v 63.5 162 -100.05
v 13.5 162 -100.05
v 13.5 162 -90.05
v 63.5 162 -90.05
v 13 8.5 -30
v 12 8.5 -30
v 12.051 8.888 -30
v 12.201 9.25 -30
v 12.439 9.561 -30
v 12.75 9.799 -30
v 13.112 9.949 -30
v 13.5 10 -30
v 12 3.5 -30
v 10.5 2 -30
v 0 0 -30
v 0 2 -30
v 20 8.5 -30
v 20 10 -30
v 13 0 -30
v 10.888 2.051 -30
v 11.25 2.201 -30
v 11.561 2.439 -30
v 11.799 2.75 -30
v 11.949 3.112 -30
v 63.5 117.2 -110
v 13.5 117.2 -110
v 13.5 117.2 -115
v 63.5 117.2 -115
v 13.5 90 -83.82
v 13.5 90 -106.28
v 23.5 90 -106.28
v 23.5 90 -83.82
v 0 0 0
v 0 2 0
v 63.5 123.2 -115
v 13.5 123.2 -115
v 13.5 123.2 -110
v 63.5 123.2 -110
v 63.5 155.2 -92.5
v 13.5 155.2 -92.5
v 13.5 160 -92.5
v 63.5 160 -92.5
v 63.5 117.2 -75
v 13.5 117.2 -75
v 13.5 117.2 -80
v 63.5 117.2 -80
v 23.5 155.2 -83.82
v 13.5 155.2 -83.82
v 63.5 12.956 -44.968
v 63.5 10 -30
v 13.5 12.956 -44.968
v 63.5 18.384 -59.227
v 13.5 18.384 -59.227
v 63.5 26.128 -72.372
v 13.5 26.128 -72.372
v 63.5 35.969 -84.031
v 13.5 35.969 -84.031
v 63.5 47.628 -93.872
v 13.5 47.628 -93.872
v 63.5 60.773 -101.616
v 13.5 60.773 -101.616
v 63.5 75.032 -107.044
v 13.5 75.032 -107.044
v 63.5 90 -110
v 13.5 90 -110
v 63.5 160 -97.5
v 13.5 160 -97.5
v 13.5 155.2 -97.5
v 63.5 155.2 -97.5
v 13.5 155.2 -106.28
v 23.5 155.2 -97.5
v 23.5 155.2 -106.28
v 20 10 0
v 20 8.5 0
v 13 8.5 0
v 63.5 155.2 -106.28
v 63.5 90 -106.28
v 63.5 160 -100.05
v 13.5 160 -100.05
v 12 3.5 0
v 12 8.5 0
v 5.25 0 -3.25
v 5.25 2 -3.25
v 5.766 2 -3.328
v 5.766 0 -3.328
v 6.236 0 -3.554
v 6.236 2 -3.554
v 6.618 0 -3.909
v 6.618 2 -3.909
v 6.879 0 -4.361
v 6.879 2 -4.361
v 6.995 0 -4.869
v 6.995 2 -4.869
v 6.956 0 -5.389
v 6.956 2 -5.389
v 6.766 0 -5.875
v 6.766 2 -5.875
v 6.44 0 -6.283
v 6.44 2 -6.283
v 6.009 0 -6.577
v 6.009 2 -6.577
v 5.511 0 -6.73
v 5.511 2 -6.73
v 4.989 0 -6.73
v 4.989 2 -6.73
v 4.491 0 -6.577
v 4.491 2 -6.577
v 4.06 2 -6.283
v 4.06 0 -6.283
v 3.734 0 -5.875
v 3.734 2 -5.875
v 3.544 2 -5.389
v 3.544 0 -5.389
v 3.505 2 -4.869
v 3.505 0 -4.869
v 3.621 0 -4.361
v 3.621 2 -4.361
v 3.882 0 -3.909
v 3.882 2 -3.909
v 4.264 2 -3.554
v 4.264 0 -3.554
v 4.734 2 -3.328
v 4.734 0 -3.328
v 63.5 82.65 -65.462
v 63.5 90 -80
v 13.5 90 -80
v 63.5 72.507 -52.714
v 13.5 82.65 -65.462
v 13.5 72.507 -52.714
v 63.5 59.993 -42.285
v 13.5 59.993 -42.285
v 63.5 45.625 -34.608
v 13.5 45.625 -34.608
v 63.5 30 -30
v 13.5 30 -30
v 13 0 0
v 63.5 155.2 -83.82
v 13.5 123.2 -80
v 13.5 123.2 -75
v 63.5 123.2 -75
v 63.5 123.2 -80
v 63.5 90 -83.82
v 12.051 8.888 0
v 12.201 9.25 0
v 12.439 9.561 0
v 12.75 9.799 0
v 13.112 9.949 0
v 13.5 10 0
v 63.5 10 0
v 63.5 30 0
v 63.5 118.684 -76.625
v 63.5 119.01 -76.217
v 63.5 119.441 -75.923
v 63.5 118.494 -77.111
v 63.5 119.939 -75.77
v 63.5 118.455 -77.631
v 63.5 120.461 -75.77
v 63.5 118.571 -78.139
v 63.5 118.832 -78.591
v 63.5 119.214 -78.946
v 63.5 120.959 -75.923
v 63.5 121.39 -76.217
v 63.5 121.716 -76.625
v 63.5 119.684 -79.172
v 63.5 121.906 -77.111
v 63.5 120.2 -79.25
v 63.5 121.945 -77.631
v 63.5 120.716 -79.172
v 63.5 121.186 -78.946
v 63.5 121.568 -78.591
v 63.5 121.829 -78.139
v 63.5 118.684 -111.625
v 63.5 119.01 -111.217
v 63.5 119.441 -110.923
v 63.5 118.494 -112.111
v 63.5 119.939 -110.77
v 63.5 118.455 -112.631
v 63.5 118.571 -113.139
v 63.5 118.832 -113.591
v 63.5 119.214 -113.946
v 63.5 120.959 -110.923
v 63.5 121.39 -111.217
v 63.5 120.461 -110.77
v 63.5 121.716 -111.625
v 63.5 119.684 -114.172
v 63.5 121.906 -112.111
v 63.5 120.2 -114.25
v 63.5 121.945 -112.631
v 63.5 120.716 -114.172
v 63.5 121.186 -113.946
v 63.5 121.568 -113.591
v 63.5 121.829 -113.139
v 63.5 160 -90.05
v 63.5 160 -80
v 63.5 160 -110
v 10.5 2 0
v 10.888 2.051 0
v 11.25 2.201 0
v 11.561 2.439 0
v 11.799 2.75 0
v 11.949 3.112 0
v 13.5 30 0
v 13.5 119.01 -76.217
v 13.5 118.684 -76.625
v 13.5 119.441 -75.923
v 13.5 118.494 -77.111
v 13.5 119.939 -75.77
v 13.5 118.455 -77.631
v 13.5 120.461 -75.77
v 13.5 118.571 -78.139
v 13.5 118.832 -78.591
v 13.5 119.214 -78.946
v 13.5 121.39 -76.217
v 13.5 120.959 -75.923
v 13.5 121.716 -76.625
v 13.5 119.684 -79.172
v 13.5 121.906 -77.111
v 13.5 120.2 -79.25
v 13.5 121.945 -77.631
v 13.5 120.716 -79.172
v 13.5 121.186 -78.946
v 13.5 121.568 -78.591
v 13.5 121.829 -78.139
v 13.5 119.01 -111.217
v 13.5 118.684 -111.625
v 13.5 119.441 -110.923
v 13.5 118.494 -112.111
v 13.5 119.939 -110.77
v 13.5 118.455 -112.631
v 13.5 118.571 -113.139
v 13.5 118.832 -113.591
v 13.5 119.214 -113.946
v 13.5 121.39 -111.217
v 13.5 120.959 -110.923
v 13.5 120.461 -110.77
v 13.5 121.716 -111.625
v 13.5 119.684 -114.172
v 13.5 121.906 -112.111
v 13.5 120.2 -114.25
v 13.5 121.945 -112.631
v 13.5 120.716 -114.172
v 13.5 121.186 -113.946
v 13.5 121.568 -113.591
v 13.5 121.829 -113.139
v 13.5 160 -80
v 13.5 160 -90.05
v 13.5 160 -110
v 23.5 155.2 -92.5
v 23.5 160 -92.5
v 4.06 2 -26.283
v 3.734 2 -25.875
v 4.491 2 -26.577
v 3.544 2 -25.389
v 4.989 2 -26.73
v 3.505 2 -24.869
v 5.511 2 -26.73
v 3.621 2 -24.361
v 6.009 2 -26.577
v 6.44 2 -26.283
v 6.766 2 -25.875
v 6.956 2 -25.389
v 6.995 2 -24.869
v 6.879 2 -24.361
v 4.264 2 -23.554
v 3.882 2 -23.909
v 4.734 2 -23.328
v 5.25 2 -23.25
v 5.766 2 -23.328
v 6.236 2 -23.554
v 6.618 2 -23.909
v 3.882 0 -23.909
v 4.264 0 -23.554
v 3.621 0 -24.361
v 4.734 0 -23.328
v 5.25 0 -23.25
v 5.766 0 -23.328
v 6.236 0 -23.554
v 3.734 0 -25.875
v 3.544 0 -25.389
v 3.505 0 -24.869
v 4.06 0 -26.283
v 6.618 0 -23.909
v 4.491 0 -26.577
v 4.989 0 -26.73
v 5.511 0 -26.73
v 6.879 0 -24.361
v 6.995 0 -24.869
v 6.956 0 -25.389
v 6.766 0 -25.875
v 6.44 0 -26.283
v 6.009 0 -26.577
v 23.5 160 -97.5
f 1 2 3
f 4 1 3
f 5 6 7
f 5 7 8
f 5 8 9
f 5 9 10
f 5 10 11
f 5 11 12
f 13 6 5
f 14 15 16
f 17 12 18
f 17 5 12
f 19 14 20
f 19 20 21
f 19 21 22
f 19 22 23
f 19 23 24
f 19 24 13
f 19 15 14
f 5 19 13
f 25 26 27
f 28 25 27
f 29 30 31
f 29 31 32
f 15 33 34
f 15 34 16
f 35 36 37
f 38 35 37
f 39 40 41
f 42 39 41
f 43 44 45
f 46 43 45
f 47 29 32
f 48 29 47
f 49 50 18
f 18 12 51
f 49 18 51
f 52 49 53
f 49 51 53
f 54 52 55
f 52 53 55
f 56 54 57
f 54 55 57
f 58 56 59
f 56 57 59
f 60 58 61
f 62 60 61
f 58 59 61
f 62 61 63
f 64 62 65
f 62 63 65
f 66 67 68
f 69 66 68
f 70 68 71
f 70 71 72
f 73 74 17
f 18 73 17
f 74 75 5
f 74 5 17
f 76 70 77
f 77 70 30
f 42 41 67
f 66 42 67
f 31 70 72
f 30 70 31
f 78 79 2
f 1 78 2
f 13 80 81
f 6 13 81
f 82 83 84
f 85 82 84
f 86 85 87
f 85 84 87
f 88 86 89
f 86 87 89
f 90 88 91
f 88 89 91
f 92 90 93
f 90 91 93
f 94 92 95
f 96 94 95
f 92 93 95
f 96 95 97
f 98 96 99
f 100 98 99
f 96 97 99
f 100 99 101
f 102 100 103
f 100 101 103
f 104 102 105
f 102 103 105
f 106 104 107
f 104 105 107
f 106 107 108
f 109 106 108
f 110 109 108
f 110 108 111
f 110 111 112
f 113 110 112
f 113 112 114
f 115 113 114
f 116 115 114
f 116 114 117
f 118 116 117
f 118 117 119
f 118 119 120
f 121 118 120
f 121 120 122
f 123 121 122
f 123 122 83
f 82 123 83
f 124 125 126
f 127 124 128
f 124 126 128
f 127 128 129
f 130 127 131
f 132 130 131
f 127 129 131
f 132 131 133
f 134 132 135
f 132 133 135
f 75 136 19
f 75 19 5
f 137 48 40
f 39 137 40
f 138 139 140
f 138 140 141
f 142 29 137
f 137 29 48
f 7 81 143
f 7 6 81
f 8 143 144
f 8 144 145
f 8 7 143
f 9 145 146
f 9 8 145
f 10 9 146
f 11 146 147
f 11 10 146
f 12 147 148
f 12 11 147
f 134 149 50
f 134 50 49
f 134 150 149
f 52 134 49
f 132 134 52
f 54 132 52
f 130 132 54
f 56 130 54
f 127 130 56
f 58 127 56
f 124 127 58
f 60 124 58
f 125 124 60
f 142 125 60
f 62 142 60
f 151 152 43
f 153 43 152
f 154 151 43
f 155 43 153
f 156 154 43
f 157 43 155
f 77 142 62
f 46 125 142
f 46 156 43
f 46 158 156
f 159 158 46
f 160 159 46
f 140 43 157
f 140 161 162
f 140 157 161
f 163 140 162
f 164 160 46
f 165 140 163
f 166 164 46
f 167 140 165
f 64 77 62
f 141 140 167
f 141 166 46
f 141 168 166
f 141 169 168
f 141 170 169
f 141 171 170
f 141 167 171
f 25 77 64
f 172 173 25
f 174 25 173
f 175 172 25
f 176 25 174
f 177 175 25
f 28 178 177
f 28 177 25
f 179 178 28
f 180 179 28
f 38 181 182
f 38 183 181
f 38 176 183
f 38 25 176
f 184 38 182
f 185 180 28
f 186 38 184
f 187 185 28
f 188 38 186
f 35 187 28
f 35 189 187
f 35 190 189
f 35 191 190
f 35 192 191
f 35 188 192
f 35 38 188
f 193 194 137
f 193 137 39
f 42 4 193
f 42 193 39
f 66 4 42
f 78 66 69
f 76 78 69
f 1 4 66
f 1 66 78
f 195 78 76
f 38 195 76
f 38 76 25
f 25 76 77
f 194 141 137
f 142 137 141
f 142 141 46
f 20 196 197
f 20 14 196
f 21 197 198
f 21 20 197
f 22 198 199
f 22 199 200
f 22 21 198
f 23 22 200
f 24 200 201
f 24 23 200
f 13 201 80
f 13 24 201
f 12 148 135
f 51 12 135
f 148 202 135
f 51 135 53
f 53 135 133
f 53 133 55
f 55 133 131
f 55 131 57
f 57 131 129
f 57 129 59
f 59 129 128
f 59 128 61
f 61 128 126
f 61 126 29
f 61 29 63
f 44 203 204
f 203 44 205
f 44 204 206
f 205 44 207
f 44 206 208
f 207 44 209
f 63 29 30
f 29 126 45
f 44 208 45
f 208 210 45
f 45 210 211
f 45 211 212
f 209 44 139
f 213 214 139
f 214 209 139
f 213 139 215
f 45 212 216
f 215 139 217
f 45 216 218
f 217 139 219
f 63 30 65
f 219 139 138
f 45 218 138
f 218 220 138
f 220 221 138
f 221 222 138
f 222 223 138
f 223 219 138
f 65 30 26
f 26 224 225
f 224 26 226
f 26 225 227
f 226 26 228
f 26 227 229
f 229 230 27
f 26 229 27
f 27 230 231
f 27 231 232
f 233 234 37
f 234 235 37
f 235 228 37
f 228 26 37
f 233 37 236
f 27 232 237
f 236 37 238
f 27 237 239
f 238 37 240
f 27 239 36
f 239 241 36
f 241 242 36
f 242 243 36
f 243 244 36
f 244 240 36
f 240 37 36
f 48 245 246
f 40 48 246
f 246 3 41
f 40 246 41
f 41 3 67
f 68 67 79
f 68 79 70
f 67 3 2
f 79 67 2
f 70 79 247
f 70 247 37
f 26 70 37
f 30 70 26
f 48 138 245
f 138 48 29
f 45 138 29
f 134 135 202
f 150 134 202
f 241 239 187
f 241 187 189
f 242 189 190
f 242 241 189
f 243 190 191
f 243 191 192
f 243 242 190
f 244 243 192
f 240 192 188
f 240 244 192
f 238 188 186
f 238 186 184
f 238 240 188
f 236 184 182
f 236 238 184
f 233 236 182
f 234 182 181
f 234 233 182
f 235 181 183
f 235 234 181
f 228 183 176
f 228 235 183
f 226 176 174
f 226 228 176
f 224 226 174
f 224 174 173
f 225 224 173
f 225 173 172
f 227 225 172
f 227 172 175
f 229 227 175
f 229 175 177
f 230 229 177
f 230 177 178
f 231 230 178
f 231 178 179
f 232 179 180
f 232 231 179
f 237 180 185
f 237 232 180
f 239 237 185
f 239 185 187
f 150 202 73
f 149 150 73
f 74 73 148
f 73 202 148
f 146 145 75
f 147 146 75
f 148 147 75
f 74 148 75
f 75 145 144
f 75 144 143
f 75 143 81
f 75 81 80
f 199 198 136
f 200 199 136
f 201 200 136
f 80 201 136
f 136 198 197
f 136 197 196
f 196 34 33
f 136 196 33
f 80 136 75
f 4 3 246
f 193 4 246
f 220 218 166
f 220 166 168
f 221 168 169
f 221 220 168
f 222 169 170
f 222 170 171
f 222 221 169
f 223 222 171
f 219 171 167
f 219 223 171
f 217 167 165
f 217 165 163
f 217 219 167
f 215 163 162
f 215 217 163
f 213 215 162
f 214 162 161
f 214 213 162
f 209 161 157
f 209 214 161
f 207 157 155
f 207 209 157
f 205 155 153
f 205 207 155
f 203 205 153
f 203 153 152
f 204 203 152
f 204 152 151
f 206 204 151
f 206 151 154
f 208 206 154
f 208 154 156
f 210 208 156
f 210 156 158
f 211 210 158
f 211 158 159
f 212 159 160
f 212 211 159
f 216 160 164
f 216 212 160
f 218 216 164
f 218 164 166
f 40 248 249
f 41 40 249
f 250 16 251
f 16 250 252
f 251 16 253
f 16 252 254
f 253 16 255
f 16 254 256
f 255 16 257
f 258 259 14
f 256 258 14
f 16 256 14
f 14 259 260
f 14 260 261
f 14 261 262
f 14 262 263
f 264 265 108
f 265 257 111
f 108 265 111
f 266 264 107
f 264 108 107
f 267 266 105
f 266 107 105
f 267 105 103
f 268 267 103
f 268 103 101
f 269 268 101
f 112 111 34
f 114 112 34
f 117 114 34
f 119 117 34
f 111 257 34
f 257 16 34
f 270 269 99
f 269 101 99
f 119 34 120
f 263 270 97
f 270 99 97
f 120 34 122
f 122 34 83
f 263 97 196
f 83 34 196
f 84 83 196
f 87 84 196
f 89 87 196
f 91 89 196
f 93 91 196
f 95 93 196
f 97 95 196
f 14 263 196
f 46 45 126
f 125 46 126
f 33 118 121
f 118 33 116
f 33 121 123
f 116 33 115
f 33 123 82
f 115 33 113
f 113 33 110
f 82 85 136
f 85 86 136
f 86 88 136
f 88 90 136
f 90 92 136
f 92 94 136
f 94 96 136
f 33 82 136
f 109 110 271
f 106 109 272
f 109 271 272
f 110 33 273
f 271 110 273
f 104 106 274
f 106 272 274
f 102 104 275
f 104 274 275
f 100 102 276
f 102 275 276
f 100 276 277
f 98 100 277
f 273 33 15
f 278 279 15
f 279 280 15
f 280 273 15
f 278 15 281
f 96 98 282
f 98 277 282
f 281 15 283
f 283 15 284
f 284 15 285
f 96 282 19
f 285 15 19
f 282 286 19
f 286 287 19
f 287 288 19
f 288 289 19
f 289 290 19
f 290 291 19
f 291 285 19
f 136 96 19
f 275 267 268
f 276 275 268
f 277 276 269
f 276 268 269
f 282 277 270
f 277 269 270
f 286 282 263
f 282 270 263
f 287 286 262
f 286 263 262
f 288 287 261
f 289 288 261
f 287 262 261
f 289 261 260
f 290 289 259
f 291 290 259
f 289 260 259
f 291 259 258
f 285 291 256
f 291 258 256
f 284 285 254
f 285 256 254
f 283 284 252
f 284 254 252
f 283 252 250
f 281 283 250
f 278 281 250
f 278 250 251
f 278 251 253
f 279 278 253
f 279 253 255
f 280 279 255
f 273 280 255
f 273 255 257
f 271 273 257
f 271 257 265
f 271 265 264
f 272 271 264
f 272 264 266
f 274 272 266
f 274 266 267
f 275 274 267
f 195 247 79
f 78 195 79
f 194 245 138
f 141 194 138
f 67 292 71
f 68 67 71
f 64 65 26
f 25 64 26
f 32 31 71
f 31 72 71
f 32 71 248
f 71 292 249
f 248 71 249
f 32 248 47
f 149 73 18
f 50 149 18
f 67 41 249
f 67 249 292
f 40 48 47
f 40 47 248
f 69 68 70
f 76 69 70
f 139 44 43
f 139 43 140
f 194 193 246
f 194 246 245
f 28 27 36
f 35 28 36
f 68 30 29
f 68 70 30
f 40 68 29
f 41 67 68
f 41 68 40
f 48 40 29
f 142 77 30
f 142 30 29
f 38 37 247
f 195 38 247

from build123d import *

# Parameters (mm, degrees)
SKETCH1_W            = 20
SKETCH1_H            = 30
BOSS_EXTRUDE1_DEPTH  = 10
SKETCH2_W            = 12
SKETCH2_H            = 8
CUT_EXTRUDE1_DEPTH   = 38.416573868
FILLET1_R            = 1.5
FILLET2_R            = 1.5
SKETCH3_W            = 7
SKETCH3_H            = 8.5
CUT_EXTRUDE2_DEPTH   = 38.416573868
SKETCH4_R            = 1.75
CUT_EXTRUDE3_DEPTH   = 37.932370625
BOSS_EXTRUDE10_DEPTH = 10
SKETCH12_11_R        = 1.75
BOSS_EXTRUDE11_DEPTH = 50
SKETCH12_12_W        = 5
SKETCH12_12_H        = 6
SKETCH12_12_R        = 1.75
BOSS_EXTRUDE12_DEPTH = 50


with BuildPart() as part:
    # Sketch1 → Boss-Extrude1 (new body)
    with BuildSketch(Plane(origin=(0, 0, 0), x_dir=(1, 0, 0), z_dir=(0, 1, 0))):
        with Locations((10, 15)):
            Rectangle(SKETCH1_W, SKETCH1_H)
    extrude(amount=BOSS_EXTRUDE1_DEPTH)

    # Sketch2 → Cut-Extrude1 (cut, through all)
    with BuildSketch(Plane.XY):
        with Locations((6, 6)):
            Rectangle(SKETCH2_W, SKETCH2_H)
    extrude(amount=-CUT_EXTRUDE1_DEPTH, mode=Mode.SUBTRACT)

    # Fillet1
    fillet1_edges = [part.edges().sort_by_distance(p)[0] for p in [
        (12, 2, -15),
    ]]
    fillet(fillet1_edges, radius=FILLET1_R)

    # Fillet2
    fillet2_edges = [part.edges().sort_by_distance(p)[0] for p in [
        (12, 10, -15),
    ]]
    fillet(fillet2_edges, radius=FILLET2_R)

    # Sketch3 → Cut-Extrude2 (cut, through all)
    with BuildSketch(Plane.XY):
        with Locations((16.5, 4.25)):
            Rectangle(SKETCH3_W, SKETCH3_H)
    extrude(amount=-CUT_EXTRUDE2_DEPTH, mode=Mode.SUBTRACT)

    # Sketch4 → Cut-Extrude3 (cut, through all)
    with BuildSketch(Plane(origin=(0, 2, 0), x_dir=(1, 0, 0), z_dir=(0, 1, 0))):
        with Locations((5.25, 25)):
            Circle(SKETCH4_R)
        with Locations((5.25, 5)):
            Circle(SKETCH4_R)
    extrude(amount=-CUT_EXTRUDE3_DEPTH, mode=Mode.SUBTRACT)

    # Sketch12<11> → Boss-Extrude11 (add)
    with BuildSketch(Plane(origin=(13.5, 0, 0), x_dir=(0, 0, -1), z_dir=(1, 0, 0))):
        with BuildLine():
            Line((0, 30), (0, 10))
            Line((0, 10), (30, 10))
            ThreePointArc((30, 10), (84.031242374, 35.968757626), (110, 90))
            Line((110, 90), (110, 117.2))
            Line((110, 117.2), (115, 117.2))
            Line((115, 117.2), (115, 123.2))
            Line((115, 123.2), (110, 123.2))
            Line((110, 123.2), (110, 160))
            Line((110, 160), (100.05, 160))
            Line((100.05, 160), (100.05, 162))
            Line((100.05, 162), (90.05, 162))
            Line((90.05, 162), (90.05, 160))
            Line((90.05, 160), (80, 160))
            Line((80, 160), (80, 123.2))
            Line((80, 123.2), (80, 117.2))
            Line((80, 117.2), (80, 90))
            ThreePointArc((80, 90), (47.180429407, 66.516308827), (30, 30))
            Line((30, 30), (0, 30))
        make_face()
        with Locations((112.5, 120.2)):
            Circle(SKETCH12_11_R, mode=Mode.SUBTRACT)
        Polygon((106.28, 155.2), (106.28, 90), (83.82, 90), (83.82, 155.2), (92.5, 155.2), (92.5, 160), (97.5, 160), (97.5, 155.2), align=None, mode=Mode.SUBTRACT)
    extrude(amount=BOSS_EXTRUDE11_DEPTH)

    # Sketch12<12> → Boss-Extrude12 (add)
    with BuildSketch(Plane(origin=(13.5, 0, 0), x_dir=(0, 0, -1), z_dir=(1, 0, 0))):
        with Locations((77.5, 120.2)):
            Rectangle(SKETCH12_12_W, SKETCH12_12_H)
        with Locations((77.5, 120.2)):
            Circle(SKETCH12_12_R, mode=Mode.SUBTRACT)
    extrude(amount=BOSS_EXTRUDE12_DEPTH)


with BuildPart() as body_2:
    # Sketch12 → Boss-Extrude10 (new body)
    with BuildSketch(Plane(origin=(13.5, 0, 0), x_dir=(0, 0, -1), z_dir=(1, 0, 0))):
        Polygon((106.28, 90), (83.82, 90), (83.82, 155.2), (92.5, 155.2), (92.5, 160), (97.5, 160), (97.5, 155.2), (106.28, 155.2), align=None)
    extrude(amount=BOSS_EXTRUDE10_DEPTH)


solid = Compound([part.part, body_2.part])
